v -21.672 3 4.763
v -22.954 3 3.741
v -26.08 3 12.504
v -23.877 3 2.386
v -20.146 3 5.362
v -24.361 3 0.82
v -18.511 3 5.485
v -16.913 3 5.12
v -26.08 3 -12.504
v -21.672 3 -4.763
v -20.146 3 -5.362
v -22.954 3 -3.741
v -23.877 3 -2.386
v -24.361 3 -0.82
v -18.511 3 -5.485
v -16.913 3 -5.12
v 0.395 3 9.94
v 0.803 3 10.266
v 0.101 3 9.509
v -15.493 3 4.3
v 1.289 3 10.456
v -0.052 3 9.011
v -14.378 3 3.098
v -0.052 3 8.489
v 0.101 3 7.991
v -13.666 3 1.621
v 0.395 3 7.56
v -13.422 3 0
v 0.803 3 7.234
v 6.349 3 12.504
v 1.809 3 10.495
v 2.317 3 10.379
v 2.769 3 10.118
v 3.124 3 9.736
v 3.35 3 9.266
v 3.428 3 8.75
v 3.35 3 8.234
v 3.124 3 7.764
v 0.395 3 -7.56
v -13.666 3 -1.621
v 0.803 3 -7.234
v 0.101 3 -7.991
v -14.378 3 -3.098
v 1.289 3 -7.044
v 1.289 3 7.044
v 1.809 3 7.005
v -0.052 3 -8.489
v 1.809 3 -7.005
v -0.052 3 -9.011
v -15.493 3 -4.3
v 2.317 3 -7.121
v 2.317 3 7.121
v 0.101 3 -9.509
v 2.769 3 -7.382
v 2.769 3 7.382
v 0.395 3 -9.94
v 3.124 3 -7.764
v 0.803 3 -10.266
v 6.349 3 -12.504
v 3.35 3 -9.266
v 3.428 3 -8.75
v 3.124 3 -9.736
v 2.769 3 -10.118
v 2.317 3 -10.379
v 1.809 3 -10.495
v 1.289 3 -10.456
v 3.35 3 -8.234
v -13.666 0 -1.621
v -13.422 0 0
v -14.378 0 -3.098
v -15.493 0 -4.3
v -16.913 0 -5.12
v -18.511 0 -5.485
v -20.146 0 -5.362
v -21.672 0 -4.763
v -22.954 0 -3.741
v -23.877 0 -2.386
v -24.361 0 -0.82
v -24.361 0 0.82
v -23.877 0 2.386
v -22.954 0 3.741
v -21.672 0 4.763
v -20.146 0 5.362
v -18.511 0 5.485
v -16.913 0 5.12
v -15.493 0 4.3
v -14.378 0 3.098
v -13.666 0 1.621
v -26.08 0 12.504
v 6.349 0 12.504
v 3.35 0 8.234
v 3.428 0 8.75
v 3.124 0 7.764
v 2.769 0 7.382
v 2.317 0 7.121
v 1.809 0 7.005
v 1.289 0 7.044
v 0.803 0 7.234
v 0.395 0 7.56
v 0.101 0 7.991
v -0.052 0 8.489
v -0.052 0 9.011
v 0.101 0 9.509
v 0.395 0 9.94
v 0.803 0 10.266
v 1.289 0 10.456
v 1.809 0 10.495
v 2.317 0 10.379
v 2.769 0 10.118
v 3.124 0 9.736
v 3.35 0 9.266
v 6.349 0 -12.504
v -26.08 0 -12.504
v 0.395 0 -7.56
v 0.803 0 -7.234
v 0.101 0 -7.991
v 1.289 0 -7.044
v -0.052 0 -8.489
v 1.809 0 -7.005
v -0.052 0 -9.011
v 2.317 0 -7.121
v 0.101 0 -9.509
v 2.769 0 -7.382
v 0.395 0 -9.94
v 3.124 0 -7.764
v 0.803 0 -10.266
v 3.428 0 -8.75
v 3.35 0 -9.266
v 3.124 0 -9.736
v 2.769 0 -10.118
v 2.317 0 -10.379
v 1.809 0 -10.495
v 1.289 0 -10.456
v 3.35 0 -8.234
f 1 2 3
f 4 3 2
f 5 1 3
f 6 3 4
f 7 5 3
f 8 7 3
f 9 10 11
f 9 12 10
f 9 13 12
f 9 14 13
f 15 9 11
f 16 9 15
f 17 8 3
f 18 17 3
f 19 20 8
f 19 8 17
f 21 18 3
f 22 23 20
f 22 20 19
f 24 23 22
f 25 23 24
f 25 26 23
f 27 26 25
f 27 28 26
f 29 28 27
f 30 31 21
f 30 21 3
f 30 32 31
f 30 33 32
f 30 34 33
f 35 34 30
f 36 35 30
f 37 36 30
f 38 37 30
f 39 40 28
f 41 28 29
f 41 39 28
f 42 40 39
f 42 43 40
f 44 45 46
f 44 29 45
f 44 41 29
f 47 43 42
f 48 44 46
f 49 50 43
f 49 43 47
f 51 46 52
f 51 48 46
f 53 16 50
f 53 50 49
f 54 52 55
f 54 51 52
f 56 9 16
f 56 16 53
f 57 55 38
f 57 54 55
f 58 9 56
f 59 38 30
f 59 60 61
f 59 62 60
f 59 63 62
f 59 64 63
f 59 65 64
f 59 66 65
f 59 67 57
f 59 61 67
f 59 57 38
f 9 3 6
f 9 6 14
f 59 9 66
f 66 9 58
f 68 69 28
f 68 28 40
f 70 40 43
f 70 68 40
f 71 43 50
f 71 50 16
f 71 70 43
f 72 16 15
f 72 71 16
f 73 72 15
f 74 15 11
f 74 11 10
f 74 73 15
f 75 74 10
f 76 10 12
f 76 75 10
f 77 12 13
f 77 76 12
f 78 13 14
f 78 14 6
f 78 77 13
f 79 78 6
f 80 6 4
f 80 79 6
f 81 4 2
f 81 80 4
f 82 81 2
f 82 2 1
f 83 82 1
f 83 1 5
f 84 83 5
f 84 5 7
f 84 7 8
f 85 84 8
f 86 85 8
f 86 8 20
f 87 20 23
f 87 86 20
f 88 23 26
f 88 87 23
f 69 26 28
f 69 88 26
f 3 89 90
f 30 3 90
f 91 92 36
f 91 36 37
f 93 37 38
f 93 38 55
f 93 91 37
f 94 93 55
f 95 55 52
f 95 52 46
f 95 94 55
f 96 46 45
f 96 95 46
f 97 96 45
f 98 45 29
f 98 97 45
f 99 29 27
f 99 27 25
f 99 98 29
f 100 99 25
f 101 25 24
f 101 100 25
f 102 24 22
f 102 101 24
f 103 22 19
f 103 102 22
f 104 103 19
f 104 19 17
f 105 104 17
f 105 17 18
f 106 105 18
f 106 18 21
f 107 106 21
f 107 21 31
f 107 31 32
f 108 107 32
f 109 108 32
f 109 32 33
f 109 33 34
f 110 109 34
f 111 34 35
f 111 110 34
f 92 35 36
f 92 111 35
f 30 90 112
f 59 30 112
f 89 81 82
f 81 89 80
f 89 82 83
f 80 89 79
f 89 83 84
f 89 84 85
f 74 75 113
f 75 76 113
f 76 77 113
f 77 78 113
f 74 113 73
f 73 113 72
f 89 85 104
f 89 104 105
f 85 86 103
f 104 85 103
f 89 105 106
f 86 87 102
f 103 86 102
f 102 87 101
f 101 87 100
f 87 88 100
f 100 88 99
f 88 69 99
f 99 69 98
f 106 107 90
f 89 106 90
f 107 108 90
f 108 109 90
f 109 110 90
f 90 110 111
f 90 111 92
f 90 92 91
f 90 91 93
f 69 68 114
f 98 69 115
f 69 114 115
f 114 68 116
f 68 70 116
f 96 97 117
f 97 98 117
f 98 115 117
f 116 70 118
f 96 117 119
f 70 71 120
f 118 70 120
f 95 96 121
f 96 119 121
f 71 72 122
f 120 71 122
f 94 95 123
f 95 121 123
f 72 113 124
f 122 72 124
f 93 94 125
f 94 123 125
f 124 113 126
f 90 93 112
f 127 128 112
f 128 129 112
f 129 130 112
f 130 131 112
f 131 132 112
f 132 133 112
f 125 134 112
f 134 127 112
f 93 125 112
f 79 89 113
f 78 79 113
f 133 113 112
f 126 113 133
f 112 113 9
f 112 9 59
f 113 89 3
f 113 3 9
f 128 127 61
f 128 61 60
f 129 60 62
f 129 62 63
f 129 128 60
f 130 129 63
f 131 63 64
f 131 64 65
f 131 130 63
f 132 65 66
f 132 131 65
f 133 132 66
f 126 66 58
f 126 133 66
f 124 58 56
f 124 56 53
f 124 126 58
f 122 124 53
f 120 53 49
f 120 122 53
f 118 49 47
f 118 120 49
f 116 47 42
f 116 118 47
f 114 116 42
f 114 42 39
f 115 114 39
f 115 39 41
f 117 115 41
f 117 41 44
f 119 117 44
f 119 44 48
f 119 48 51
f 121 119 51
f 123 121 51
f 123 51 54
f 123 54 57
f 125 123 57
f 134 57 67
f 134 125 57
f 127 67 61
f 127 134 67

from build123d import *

# Parameters (mm, degrees)
SKETCH1_W           = 32.429536638
SKETCH1_H           = 25.007766804
SKETCH1_R           = 1.75
SKETCH1_R_2         = 5.5
BOSS_EXTRUDE1_DEPTH = 3


with BuildPart() as part:
    # Sketch1 → Boss-Extrude1 (new body)
    with BuildSketch(Plane(origin=(0, 0, 0), x_dir=(1, 0, 0), z_dir=(0, 1, 0))):
        with Locations((-9.865681564, 0)):
            Rectangle(SKETCH1_W, SKETCH1_H)
        with Locations((1.678034292, -8.75)):
            Circle(SKETCH1_R, mode=Mode.SUBTRACT)
        with Locations((1.678034292, 8.75)):
            Circle(SKETCH1_R, mode=Mode.SUBTRACT)
        with Locations((-18.921965708, 0)):
            Circle(SKETCH1_R_2, mode=Mode.SUBTRACT)
    extrude(amount=BOSS_EXTRUDE1_DEPTH)


solid = part.part
